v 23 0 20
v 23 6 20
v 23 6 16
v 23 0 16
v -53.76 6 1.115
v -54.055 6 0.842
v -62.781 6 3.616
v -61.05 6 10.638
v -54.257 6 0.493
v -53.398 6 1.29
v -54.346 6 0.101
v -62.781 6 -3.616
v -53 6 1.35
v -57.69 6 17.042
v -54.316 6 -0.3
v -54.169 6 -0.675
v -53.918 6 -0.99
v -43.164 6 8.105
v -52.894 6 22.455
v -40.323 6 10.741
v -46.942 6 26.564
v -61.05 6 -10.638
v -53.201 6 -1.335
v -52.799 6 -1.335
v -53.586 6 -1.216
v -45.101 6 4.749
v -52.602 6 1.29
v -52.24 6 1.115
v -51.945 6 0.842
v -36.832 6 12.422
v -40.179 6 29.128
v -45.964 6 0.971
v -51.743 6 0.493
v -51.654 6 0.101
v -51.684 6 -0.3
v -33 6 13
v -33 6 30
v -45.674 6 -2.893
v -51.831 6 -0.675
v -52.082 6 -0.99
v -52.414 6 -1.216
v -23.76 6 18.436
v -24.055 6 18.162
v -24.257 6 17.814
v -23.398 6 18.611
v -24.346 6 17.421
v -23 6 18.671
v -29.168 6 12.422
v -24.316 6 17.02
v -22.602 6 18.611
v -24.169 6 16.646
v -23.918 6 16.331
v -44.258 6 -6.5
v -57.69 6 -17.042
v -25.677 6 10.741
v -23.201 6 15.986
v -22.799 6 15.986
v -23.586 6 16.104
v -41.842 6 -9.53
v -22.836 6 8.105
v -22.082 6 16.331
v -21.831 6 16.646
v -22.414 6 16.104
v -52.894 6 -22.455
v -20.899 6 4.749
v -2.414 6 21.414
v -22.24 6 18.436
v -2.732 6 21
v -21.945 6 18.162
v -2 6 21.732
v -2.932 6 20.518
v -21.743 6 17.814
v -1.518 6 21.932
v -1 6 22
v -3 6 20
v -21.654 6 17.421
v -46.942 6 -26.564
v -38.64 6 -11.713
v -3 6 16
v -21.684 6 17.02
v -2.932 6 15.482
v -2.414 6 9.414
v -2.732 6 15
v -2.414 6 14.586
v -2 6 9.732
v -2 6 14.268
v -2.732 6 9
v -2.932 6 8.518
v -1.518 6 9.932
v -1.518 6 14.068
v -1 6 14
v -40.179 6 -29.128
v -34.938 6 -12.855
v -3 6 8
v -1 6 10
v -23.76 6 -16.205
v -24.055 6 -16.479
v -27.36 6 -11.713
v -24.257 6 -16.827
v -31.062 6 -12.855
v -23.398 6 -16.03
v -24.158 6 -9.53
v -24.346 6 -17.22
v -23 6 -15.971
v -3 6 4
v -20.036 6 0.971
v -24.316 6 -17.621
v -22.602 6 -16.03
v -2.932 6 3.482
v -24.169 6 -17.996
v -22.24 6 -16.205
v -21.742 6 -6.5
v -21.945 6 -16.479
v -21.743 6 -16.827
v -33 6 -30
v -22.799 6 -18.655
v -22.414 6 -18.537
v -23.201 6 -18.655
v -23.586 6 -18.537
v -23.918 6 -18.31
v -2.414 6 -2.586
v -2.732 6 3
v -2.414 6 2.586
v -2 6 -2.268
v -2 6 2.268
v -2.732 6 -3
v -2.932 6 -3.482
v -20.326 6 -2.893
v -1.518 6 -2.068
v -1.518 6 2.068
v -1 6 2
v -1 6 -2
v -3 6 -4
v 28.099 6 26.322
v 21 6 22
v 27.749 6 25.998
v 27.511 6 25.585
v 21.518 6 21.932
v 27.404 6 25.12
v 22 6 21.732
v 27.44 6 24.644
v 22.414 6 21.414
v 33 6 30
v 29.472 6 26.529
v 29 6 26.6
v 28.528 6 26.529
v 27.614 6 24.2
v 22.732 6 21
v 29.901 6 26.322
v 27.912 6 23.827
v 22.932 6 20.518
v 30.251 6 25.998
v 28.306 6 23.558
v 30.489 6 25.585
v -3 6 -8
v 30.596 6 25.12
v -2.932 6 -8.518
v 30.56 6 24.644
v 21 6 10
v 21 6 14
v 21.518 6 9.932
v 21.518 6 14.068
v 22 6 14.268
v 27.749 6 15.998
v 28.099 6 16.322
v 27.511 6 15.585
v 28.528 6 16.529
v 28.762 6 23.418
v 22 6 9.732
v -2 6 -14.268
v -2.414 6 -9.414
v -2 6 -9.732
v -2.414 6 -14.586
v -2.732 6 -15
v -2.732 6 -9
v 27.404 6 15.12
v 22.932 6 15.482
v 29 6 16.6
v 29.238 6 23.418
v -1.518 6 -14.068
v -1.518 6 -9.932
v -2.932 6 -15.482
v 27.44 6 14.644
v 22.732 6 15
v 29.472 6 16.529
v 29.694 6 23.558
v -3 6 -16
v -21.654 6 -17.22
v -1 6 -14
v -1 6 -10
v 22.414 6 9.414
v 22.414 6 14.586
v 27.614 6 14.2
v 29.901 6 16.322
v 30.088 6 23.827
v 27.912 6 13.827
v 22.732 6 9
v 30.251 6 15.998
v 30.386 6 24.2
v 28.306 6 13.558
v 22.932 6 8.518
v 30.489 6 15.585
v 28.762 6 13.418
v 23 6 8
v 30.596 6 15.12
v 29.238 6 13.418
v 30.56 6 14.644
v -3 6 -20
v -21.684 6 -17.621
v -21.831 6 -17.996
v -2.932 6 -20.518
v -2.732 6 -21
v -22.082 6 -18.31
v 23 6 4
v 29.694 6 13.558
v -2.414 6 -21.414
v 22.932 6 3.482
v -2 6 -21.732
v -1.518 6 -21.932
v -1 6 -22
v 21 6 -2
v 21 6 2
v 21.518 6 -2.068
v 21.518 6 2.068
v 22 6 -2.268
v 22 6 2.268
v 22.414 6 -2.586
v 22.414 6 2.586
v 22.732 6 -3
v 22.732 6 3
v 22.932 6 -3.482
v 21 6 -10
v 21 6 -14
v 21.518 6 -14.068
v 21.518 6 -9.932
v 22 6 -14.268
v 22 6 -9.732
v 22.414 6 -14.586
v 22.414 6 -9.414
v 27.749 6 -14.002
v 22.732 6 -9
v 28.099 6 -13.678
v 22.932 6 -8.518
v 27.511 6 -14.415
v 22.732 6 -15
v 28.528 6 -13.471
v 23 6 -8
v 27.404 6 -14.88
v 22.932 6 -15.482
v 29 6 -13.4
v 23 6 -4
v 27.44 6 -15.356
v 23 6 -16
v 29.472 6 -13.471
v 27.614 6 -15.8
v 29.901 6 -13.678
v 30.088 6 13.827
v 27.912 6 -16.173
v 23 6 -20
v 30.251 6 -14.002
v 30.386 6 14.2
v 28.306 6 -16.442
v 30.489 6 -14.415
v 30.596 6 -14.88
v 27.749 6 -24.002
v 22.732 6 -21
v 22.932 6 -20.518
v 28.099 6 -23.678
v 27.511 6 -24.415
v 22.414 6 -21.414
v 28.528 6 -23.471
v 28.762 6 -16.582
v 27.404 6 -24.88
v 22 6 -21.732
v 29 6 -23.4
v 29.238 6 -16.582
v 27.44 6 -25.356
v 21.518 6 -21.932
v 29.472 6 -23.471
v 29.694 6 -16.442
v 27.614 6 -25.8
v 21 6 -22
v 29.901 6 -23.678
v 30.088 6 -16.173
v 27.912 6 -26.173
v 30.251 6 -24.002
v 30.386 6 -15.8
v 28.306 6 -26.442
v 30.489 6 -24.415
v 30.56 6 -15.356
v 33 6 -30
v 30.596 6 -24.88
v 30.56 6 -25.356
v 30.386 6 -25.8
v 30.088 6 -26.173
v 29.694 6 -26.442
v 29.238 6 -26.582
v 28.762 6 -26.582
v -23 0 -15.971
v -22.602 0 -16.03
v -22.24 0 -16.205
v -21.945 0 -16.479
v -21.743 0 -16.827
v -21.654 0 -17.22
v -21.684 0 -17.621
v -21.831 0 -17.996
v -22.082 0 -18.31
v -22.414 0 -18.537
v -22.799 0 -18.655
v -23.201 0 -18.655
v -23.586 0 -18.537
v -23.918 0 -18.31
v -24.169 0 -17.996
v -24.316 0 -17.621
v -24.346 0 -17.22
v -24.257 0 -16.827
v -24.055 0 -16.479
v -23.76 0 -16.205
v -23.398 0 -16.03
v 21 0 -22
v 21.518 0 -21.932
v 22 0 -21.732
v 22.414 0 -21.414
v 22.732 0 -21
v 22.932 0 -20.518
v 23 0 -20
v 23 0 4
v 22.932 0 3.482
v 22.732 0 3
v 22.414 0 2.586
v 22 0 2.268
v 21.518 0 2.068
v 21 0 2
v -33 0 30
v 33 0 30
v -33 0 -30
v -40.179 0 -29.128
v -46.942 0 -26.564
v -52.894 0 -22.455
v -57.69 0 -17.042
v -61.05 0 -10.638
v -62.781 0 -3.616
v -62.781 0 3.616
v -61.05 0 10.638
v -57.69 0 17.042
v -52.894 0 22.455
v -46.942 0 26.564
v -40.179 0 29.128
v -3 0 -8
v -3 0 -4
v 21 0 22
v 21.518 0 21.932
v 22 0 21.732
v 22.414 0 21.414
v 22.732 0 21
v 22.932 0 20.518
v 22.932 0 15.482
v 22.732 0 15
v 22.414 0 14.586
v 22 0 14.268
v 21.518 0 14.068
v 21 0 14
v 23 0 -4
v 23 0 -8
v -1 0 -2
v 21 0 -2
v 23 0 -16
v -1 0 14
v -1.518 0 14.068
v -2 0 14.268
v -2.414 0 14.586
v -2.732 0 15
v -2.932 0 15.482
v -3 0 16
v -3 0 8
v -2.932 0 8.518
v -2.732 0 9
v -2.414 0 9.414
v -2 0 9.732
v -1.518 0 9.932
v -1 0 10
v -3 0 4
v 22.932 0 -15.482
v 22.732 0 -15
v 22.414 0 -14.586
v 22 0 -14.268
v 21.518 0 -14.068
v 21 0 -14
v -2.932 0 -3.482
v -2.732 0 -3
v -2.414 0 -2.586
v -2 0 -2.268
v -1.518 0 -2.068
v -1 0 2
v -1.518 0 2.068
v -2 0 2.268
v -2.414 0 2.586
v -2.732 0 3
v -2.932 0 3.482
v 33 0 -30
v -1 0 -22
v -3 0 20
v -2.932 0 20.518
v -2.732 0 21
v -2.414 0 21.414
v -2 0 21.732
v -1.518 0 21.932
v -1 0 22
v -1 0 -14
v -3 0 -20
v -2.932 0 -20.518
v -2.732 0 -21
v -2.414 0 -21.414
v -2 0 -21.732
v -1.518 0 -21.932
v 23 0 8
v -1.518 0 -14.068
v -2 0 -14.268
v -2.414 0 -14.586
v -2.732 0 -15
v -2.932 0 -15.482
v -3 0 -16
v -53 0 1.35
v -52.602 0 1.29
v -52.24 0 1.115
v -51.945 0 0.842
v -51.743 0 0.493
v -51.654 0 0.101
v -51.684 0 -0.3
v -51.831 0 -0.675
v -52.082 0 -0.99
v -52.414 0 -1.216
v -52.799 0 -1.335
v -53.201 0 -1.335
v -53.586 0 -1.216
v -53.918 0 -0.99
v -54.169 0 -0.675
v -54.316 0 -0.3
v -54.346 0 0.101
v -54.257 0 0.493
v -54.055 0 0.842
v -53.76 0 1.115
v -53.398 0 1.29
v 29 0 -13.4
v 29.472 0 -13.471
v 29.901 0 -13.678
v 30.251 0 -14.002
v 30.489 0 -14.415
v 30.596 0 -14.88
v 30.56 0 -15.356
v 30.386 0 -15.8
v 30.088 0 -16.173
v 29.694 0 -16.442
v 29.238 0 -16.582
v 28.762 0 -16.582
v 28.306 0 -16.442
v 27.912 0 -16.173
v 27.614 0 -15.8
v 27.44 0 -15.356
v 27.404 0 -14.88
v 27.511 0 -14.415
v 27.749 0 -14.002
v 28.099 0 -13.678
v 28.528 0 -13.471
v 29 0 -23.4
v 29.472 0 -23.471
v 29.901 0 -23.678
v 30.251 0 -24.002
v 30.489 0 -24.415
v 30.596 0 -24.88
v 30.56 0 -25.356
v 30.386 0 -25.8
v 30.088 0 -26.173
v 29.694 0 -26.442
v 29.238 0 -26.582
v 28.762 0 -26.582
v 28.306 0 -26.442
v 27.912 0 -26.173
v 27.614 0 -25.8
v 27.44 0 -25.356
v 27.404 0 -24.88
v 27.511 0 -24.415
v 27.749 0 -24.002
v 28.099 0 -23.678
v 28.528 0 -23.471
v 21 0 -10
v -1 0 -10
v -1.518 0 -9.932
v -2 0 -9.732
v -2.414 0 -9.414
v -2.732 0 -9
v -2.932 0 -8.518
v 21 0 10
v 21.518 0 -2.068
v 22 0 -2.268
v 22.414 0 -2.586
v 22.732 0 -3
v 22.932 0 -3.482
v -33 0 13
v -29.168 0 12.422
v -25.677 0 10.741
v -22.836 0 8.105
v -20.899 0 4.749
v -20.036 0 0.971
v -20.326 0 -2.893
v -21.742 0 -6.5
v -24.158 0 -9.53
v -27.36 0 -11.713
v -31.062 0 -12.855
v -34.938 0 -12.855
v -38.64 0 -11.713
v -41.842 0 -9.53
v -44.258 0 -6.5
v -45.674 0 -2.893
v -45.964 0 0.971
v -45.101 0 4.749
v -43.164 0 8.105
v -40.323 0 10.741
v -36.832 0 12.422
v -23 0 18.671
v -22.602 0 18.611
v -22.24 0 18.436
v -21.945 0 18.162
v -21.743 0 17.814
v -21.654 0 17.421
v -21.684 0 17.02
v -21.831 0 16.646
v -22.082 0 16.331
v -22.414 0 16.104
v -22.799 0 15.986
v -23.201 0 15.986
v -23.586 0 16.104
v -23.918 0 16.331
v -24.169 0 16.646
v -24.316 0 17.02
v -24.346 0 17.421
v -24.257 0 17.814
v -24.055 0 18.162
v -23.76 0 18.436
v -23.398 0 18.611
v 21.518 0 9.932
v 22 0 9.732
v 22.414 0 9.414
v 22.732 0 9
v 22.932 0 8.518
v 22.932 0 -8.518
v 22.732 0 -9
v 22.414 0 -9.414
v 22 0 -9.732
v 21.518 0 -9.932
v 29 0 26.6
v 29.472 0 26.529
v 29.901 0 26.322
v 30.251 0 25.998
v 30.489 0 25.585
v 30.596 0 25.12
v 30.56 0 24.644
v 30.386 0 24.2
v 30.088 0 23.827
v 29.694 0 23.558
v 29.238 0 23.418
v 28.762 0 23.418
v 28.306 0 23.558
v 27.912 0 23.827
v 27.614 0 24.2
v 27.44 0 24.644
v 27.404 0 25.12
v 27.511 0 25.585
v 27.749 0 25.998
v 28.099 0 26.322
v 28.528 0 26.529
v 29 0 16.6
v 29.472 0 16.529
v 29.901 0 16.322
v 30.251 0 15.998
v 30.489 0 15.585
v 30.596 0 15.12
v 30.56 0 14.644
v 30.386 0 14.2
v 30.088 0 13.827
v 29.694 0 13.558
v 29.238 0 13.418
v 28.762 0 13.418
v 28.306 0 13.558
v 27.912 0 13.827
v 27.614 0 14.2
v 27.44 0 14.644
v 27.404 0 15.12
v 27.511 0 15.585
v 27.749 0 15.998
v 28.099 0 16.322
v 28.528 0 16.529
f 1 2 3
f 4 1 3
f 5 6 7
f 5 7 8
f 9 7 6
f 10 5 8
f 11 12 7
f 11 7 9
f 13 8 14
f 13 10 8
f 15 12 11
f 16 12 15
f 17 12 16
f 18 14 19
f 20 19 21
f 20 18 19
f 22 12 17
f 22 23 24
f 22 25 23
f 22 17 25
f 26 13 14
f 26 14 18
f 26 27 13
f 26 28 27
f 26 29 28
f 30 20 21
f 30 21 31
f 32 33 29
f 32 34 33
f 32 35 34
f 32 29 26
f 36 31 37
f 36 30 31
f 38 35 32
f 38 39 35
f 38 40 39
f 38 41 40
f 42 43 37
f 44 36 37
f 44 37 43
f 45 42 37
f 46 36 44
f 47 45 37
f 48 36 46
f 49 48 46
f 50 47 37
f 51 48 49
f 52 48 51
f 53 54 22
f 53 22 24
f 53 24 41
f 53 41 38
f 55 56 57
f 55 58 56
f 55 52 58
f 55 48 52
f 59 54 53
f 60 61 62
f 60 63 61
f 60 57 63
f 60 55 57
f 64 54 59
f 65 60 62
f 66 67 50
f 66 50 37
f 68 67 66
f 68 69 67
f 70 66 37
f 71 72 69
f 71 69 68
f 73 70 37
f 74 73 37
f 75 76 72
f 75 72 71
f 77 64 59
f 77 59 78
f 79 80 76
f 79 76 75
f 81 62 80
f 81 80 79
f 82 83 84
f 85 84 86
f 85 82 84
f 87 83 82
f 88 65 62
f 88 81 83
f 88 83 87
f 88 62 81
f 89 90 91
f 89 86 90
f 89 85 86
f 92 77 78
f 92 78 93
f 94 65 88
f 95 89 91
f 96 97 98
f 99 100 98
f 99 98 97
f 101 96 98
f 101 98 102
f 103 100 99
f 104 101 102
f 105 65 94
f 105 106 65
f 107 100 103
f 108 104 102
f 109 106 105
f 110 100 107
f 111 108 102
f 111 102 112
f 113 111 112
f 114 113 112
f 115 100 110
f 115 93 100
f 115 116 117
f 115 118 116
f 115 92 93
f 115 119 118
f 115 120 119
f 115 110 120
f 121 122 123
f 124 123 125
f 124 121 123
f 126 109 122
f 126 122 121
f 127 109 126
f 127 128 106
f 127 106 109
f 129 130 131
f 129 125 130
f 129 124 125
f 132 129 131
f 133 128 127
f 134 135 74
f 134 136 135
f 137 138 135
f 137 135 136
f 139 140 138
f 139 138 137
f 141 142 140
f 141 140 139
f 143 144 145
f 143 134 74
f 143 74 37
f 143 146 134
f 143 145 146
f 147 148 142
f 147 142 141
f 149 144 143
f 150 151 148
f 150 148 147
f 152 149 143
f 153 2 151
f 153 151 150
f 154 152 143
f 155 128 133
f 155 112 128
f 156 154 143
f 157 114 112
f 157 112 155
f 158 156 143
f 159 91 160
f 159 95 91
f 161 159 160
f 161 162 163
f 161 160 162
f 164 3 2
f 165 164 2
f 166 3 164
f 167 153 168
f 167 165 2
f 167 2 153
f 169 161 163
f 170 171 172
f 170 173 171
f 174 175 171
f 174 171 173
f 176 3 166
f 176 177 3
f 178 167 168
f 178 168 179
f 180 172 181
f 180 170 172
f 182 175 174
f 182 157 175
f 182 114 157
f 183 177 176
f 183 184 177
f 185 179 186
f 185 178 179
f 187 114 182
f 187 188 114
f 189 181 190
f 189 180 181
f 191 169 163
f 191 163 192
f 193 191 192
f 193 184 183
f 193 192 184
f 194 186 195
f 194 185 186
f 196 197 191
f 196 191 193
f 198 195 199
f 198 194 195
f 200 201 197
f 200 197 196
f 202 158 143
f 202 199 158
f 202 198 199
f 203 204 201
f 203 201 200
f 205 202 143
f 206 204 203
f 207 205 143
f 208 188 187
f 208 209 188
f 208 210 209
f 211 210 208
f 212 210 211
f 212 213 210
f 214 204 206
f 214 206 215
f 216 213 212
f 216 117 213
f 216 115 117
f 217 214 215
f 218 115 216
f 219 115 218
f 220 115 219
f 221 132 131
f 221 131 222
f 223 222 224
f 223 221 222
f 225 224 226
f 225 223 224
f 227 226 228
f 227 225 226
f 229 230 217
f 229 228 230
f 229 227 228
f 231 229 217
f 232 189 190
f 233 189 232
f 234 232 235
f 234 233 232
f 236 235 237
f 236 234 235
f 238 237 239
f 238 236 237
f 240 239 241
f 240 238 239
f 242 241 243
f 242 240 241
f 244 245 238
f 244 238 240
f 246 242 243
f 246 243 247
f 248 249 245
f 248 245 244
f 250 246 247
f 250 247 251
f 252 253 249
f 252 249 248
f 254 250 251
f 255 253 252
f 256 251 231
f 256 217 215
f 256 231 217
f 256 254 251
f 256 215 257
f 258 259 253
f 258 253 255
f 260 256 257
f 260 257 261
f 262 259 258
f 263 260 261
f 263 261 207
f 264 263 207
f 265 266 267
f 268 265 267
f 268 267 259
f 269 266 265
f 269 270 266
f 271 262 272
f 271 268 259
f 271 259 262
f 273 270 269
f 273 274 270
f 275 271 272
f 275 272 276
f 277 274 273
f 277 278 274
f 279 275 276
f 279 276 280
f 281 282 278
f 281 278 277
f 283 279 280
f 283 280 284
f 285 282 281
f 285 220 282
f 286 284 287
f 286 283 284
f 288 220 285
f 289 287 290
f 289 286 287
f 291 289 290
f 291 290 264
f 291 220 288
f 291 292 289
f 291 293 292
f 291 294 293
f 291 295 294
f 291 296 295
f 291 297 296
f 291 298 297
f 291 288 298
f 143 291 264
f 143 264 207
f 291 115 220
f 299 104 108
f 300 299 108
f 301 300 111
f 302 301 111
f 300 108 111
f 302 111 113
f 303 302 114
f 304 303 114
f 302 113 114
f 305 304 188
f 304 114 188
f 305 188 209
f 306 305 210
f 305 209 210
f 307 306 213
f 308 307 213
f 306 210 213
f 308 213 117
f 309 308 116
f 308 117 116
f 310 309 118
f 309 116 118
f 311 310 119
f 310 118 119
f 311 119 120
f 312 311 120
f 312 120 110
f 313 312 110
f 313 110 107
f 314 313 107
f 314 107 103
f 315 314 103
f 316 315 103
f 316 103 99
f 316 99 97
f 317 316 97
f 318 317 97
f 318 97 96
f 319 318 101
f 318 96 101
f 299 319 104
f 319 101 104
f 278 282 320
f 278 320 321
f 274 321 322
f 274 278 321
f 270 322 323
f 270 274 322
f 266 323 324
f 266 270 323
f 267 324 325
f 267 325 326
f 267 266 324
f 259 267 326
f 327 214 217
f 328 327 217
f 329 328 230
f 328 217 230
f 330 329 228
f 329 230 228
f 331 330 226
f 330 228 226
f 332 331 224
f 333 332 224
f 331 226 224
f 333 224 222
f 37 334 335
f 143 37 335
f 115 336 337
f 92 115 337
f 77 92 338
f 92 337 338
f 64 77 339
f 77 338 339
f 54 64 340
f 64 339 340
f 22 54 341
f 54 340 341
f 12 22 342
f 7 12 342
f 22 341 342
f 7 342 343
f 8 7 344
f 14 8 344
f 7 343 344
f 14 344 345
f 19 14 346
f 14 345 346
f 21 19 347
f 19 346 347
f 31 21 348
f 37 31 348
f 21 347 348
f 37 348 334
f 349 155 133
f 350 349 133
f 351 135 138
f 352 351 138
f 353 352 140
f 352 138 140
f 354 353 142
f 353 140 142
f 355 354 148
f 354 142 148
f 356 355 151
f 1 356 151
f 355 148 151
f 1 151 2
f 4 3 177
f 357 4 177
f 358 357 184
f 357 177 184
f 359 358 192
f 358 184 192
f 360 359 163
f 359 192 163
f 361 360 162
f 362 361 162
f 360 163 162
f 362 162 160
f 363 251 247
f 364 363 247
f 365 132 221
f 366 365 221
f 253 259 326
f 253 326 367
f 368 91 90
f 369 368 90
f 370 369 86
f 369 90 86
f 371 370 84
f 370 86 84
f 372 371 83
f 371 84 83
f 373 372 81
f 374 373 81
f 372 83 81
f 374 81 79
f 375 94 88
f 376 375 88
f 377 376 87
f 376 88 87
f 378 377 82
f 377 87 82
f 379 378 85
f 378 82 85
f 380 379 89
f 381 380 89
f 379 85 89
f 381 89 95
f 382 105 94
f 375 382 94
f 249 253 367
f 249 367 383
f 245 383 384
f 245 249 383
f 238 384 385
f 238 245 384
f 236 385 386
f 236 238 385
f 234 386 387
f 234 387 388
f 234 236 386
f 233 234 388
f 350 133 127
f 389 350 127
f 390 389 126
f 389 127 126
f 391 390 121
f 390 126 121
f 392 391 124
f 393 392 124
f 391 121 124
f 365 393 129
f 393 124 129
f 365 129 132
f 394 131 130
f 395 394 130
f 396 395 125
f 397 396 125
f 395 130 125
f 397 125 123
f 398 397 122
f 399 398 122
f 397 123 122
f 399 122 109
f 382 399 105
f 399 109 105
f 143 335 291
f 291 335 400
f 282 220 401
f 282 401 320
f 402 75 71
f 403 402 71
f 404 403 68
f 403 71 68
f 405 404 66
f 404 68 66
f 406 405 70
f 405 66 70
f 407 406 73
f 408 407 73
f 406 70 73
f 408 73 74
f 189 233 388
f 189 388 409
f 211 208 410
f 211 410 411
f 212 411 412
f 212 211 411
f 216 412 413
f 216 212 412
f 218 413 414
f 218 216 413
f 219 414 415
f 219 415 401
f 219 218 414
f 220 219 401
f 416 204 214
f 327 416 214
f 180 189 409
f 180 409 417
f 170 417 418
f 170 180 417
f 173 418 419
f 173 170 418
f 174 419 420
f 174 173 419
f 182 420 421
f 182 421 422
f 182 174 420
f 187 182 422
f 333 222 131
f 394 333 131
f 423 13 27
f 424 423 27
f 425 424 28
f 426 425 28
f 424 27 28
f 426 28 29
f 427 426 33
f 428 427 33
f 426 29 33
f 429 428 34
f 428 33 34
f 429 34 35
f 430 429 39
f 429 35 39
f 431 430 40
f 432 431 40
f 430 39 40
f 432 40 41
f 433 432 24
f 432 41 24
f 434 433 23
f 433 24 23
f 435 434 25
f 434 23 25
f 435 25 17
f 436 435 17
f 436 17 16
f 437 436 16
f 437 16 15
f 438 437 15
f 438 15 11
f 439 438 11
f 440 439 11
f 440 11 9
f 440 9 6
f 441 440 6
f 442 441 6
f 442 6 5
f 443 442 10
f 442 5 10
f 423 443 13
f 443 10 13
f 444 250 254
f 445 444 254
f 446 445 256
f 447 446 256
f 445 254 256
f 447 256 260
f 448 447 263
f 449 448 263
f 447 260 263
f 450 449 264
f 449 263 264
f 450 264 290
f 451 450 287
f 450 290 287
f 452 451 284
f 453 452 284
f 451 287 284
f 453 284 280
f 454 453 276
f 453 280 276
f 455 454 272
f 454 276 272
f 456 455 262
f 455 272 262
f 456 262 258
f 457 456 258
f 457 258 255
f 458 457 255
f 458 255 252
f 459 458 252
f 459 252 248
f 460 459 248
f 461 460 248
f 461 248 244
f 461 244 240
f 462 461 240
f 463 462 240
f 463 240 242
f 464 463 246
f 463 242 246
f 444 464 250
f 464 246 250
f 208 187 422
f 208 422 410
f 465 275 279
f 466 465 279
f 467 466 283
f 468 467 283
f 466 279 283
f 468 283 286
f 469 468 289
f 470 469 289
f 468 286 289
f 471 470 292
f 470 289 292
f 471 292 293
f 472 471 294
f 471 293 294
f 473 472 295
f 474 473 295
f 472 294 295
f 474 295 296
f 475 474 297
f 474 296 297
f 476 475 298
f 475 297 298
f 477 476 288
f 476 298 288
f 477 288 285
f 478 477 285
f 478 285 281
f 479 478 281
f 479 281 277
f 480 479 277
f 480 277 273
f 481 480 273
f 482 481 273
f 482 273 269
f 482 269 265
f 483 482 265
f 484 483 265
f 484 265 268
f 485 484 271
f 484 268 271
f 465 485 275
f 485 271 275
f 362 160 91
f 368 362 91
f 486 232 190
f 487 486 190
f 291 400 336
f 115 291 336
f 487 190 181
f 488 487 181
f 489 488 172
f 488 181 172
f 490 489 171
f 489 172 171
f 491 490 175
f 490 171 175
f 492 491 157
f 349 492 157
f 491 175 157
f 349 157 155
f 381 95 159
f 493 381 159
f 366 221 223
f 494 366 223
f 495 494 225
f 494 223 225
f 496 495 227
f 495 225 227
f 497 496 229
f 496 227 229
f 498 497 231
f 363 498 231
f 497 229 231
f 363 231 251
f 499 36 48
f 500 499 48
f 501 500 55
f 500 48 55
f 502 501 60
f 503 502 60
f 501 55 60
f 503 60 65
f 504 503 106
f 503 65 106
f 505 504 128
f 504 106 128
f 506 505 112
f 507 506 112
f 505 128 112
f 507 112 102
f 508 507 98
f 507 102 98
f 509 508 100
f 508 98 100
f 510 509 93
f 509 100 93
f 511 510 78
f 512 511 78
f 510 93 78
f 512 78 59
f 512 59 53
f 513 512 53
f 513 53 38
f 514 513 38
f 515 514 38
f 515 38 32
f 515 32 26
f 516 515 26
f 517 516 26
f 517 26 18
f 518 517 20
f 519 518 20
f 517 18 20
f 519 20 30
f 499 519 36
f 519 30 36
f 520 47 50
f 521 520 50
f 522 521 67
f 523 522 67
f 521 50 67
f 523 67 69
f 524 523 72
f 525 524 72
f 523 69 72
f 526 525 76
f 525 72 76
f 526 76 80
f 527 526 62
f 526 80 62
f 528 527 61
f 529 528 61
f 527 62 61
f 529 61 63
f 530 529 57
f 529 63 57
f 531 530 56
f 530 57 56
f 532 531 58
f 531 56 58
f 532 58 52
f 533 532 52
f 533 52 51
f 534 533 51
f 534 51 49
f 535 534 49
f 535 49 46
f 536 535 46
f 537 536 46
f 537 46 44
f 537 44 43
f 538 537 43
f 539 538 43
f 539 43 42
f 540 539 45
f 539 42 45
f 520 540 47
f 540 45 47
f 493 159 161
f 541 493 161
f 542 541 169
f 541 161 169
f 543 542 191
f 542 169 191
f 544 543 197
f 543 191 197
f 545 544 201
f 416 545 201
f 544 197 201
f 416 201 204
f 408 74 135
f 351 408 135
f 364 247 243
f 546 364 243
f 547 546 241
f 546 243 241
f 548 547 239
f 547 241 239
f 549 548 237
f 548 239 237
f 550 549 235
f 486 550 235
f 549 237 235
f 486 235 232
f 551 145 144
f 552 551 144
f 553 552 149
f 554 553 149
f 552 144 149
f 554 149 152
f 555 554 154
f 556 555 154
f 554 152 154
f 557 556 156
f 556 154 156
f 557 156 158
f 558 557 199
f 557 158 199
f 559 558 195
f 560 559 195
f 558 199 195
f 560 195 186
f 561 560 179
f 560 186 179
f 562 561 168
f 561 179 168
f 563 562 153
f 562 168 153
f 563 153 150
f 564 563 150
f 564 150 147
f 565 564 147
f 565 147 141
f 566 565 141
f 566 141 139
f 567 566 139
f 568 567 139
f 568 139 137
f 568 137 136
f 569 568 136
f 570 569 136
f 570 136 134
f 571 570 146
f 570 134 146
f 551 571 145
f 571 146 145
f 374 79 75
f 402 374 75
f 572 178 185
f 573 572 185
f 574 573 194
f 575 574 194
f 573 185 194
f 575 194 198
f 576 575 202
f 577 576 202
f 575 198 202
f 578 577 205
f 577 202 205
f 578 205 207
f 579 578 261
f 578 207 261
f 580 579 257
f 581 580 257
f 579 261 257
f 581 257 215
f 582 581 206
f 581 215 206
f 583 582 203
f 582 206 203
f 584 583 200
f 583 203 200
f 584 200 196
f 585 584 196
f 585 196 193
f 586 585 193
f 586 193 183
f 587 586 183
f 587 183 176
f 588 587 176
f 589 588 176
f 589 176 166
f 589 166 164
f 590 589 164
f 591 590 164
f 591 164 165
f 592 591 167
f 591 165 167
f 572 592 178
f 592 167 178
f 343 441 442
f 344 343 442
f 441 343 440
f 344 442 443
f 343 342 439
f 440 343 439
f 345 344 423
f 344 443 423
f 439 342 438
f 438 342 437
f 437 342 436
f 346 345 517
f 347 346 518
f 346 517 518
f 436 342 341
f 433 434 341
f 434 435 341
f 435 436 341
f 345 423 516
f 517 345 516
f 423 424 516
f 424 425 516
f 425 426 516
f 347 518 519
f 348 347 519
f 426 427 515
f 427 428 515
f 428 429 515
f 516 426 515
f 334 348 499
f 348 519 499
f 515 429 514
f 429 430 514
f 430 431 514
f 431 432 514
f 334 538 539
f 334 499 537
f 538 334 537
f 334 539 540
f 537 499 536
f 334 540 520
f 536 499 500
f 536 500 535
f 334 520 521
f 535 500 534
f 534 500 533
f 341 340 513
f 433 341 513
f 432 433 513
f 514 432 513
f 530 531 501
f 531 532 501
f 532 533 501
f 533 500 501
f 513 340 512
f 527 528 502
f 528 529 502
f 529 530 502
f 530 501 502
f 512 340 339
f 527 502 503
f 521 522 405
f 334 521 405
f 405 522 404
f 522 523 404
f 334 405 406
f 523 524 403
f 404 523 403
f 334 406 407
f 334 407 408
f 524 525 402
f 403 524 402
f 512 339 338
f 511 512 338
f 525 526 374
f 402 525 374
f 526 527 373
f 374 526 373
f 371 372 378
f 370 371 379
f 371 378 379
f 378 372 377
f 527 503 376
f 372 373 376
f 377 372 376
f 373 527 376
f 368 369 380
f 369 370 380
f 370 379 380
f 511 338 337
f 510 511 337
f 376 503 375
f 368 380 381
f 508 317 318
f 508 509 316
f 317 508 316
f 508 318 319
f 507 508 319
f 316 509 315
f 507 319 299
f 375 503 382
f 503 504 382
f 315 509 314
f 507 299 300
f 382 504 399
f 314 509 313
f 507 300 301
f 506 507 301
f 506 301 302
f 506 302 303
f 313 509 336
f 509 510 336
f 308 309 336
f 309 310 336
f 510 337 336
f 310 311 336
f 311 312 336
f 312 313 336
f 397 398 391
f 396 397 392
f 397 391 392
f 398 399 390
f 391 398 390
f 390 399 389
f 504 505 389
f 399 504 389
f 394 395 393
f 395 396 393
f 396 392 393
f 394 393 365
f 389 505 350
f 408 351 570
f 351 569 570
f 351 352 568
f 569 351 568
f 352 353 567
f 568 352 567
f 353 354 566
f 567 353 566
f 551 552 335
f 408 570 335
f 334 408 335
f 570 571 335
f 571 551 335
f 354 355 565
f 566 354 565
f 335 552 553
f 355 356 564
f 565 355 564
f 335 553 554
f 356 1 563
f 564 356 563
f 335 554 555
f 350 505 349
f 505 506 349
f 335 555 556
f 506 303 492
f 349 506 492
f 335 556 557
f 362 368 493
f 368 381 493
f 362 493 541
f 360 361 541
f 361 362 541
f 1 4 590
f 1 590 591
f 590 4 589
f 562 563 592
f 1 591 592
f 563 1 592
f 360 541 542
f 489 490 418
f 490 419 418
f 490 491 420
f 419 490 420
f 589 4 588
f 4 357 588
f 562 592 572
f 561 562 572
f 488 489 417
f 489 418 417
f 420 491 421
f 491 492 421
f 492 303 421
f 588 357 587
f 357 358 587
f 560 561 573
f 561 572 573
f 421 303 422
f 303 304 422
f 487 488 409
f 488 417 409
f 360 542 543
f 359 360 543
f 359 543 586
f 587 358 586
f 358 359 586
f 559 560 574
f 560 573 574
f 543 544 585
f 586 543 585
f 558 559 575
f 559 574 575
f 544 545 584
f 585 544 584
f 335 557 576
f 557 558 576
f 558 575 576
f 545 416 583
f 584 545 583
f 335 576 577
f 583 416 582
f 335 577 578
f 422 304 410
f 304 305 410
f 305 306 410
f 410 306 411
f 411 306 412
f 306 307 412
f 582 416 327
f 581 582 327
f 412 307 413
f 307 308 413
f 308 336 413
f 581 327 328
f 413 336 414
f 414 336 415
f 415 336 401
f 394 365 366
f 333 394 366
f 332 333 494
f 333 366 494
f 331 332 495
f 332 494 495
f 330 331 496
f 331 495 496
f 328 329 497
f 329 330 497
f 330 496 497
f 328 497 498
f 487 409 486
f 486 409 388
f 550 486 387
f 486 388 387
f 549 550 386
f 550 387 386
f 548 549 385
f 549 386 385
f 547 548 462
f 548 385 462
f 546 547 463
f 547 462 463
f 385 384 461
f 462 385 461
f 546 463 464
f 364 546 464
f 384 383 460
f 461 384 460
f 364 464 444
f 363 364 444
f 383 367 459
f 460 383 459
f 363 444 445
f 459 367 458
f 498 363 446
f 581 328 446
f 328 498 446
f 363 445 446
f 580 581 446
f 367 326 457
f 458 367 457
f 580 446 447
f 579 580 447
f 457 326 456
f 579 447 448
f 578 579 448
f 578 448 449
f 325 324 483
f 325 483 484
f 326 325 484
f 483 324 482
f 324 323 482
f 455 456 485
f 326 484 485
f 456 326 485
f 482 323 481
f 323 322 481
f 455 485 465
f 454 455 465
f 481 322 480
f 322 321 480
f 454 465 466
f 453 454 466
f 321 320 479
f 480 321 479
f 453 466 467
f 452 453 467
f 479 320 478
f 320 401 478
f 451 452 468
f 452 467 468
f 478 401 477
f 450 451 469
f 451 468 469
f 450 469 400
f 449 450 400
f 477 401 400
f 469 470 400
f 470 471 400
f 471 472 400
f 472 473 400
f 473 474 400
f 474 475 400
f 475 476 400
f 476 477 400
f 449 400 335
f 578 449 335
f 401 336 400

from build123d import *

# Parameters (mm, degrees)
EXTRUDE_1_DEPTH     = 6
SKETCH_2_R          = 13
SKETCH_2_R_2        = 1.35
CUT_EXTRUDE_1_DEPTH = 6
CUT_EXTRUDE_2_DEPTH = 6
SKETCH_4_R          = 1.6
CUT_EXTRUDE_3_DEPTH = 6


with BuildPart() as part:
    # 草图1 → 凸台-拉伸1 (new body)
    with BuildSketch(Plane(origin=(0, 0, 0), x_dir=(1, 0, 0), z_dir=(0, 1, 0))):
        with BuildLine():
            Line((-33, -30), (33, -30))
            Line((33, -30), (33, 30))
            Line((33, 30), (-33, 30))
            ThreePointArc((-33, 30), (-63, 0), (-33, -30))
        make_face()
    extrude(amount=EXTRUDE_1_DEPTH)

    # 草图2 → 切除-拉伸1 (cut)
    with BuildSketch(Plane(origin=(0, 6, 0), x_dir=(1, 0, 0), z_dir=(0, 1, 0))):
        with Locations(Location((-33, 0, 0), (0, 0, 270))):
            Circle(SKETCH_2_R)
        with Locations(Location((-53, 0, 0), (0, 0, 270))):
            Circle(SKETCH_2_R_2)
        with Locations(Location((-23, 17.320508076, 0), (0, 0, 270))):
            Circle(SKETCH_2_R_2)
        with Locations(Location((-23, -17.320508076, 0), (0, 0, 270))):
            Circle(SKETCH_2_R_2)
    extrude(amount=-CUT_EXTRUDE_1_DEPTH, mode=Mode.SUBTRACT)

    # 草图3 → 切除-拉伸2 (cut)
    with BuildSketch(Plane(origin=(0, 6, 0), x_dir=(1, 0, 0), z_dir=(0, 1, 0))):
        with BuildLine():
            Line((21, 14), (-1, 14))
            ThreePointArc((-1, 14), (-2.414213562, 14.585786438), (-3, 16))
            Line((-3, 16), (-3, 20))
            ThreePointArc((-3, 20), (-2.414213562, 21.414213562), (-1, 22))
            Line((-1, 22), (21, 22))
            ThreePointArc((21, 22), (22.414213562, 21.414213562), (23, 20))
            Line((23, 20), (23, 16))
            ThreePointArc((23, 16), (22.414213562, 14.585786438), (21, 14))
        make_face()
        with BuildLine():
            Line((23, 4), (23, 8))
            ThreePointArc((23, 8), (22.414213562, 9.414213562), (21, 10))
            Line((21, 10), (-1, 10))
            ThreePointArc((-1, 10), (-2.414213562, 9.414213562), (-3, 8))
            Line((-3, 8), (-3, 4))
            ThreePointArc((-3, 4), (-2.414213562, 2.585786438), (-1, 2))
            Line((-1, 2), (21, 2))
            ThreePointArc((21, 2), (22.414213562, 2.585786438), (23, 4))
        make_face()
        with BuildLine():
            Line((23, -8), (23, -4))
            ThreePointArc((23, -4), (22.414213562, -2.585786438), (21, -2))
            Line((21, -2), (-1, -2))
            ThreePointArc((-1, -2), (-2.414213562, -2.585786438), (-3, -4))
            Line((-3, -4), (-3, -8))
            ThreePointArc((-3, -8), (-2.414213562, -9.414213562), (-1, -10))
            Line((-1, -10), (21, -10))
            ThreePointArc((21, -10), (22.414213562, -9.414213562), (23, -8))
        make_face()
        with BuildLine():
            Line((23, -20), (23, -16))
            ThreePointArc((23, -16), (22.414213562, -14.585786438), (21, -14))
            Line((21, -14), (-1, -14))
            ThreePointArc((-1, -14), (-2.414213562, -14.585786438), (-3, -16))
            Line((-3, -16), (-3, -20))
            ThreePointArc((-3, -20), (-2.414213562, -21.414213562), (-1, -22))
            Line((-1, -22), (21, -22))
            ThreePointArc((21, -22), (22.414213562, -21.414213562), (23, -20))
        make_face()
    extrude(amount=-CUT_EXTRUDE_2_DEPTH, mode=Mode.SUBTRACT)

    # 草图4 → 切除-拉伸3 (cut)
    with BuildSketch(Plane(origin=(0, 6, 0), x_dir=(1, 0, 0), z_dir=(0, 1, 0))):
        with Locations(Location((29, 25, 0), (0, 0, 270))):
            Circle(SKETCH_4_R)
        with Locations(Location((29, 15, 0), (0, 0, 270))):
            Circle(SKETCH_4_R)
        with Locations(Location((29, -25, 0), (0, 0, 270))):
            Circle(SKETCH_4_R)
        with Locations(Location((29, -15, 0), (0, 0, 270))):
            Circle(SKETCH_4_R)
    extrude(amount=-CUT_EXTRUDE_3_DEPTH, mode=Mode.SUBTRACT)


solid = part.part
